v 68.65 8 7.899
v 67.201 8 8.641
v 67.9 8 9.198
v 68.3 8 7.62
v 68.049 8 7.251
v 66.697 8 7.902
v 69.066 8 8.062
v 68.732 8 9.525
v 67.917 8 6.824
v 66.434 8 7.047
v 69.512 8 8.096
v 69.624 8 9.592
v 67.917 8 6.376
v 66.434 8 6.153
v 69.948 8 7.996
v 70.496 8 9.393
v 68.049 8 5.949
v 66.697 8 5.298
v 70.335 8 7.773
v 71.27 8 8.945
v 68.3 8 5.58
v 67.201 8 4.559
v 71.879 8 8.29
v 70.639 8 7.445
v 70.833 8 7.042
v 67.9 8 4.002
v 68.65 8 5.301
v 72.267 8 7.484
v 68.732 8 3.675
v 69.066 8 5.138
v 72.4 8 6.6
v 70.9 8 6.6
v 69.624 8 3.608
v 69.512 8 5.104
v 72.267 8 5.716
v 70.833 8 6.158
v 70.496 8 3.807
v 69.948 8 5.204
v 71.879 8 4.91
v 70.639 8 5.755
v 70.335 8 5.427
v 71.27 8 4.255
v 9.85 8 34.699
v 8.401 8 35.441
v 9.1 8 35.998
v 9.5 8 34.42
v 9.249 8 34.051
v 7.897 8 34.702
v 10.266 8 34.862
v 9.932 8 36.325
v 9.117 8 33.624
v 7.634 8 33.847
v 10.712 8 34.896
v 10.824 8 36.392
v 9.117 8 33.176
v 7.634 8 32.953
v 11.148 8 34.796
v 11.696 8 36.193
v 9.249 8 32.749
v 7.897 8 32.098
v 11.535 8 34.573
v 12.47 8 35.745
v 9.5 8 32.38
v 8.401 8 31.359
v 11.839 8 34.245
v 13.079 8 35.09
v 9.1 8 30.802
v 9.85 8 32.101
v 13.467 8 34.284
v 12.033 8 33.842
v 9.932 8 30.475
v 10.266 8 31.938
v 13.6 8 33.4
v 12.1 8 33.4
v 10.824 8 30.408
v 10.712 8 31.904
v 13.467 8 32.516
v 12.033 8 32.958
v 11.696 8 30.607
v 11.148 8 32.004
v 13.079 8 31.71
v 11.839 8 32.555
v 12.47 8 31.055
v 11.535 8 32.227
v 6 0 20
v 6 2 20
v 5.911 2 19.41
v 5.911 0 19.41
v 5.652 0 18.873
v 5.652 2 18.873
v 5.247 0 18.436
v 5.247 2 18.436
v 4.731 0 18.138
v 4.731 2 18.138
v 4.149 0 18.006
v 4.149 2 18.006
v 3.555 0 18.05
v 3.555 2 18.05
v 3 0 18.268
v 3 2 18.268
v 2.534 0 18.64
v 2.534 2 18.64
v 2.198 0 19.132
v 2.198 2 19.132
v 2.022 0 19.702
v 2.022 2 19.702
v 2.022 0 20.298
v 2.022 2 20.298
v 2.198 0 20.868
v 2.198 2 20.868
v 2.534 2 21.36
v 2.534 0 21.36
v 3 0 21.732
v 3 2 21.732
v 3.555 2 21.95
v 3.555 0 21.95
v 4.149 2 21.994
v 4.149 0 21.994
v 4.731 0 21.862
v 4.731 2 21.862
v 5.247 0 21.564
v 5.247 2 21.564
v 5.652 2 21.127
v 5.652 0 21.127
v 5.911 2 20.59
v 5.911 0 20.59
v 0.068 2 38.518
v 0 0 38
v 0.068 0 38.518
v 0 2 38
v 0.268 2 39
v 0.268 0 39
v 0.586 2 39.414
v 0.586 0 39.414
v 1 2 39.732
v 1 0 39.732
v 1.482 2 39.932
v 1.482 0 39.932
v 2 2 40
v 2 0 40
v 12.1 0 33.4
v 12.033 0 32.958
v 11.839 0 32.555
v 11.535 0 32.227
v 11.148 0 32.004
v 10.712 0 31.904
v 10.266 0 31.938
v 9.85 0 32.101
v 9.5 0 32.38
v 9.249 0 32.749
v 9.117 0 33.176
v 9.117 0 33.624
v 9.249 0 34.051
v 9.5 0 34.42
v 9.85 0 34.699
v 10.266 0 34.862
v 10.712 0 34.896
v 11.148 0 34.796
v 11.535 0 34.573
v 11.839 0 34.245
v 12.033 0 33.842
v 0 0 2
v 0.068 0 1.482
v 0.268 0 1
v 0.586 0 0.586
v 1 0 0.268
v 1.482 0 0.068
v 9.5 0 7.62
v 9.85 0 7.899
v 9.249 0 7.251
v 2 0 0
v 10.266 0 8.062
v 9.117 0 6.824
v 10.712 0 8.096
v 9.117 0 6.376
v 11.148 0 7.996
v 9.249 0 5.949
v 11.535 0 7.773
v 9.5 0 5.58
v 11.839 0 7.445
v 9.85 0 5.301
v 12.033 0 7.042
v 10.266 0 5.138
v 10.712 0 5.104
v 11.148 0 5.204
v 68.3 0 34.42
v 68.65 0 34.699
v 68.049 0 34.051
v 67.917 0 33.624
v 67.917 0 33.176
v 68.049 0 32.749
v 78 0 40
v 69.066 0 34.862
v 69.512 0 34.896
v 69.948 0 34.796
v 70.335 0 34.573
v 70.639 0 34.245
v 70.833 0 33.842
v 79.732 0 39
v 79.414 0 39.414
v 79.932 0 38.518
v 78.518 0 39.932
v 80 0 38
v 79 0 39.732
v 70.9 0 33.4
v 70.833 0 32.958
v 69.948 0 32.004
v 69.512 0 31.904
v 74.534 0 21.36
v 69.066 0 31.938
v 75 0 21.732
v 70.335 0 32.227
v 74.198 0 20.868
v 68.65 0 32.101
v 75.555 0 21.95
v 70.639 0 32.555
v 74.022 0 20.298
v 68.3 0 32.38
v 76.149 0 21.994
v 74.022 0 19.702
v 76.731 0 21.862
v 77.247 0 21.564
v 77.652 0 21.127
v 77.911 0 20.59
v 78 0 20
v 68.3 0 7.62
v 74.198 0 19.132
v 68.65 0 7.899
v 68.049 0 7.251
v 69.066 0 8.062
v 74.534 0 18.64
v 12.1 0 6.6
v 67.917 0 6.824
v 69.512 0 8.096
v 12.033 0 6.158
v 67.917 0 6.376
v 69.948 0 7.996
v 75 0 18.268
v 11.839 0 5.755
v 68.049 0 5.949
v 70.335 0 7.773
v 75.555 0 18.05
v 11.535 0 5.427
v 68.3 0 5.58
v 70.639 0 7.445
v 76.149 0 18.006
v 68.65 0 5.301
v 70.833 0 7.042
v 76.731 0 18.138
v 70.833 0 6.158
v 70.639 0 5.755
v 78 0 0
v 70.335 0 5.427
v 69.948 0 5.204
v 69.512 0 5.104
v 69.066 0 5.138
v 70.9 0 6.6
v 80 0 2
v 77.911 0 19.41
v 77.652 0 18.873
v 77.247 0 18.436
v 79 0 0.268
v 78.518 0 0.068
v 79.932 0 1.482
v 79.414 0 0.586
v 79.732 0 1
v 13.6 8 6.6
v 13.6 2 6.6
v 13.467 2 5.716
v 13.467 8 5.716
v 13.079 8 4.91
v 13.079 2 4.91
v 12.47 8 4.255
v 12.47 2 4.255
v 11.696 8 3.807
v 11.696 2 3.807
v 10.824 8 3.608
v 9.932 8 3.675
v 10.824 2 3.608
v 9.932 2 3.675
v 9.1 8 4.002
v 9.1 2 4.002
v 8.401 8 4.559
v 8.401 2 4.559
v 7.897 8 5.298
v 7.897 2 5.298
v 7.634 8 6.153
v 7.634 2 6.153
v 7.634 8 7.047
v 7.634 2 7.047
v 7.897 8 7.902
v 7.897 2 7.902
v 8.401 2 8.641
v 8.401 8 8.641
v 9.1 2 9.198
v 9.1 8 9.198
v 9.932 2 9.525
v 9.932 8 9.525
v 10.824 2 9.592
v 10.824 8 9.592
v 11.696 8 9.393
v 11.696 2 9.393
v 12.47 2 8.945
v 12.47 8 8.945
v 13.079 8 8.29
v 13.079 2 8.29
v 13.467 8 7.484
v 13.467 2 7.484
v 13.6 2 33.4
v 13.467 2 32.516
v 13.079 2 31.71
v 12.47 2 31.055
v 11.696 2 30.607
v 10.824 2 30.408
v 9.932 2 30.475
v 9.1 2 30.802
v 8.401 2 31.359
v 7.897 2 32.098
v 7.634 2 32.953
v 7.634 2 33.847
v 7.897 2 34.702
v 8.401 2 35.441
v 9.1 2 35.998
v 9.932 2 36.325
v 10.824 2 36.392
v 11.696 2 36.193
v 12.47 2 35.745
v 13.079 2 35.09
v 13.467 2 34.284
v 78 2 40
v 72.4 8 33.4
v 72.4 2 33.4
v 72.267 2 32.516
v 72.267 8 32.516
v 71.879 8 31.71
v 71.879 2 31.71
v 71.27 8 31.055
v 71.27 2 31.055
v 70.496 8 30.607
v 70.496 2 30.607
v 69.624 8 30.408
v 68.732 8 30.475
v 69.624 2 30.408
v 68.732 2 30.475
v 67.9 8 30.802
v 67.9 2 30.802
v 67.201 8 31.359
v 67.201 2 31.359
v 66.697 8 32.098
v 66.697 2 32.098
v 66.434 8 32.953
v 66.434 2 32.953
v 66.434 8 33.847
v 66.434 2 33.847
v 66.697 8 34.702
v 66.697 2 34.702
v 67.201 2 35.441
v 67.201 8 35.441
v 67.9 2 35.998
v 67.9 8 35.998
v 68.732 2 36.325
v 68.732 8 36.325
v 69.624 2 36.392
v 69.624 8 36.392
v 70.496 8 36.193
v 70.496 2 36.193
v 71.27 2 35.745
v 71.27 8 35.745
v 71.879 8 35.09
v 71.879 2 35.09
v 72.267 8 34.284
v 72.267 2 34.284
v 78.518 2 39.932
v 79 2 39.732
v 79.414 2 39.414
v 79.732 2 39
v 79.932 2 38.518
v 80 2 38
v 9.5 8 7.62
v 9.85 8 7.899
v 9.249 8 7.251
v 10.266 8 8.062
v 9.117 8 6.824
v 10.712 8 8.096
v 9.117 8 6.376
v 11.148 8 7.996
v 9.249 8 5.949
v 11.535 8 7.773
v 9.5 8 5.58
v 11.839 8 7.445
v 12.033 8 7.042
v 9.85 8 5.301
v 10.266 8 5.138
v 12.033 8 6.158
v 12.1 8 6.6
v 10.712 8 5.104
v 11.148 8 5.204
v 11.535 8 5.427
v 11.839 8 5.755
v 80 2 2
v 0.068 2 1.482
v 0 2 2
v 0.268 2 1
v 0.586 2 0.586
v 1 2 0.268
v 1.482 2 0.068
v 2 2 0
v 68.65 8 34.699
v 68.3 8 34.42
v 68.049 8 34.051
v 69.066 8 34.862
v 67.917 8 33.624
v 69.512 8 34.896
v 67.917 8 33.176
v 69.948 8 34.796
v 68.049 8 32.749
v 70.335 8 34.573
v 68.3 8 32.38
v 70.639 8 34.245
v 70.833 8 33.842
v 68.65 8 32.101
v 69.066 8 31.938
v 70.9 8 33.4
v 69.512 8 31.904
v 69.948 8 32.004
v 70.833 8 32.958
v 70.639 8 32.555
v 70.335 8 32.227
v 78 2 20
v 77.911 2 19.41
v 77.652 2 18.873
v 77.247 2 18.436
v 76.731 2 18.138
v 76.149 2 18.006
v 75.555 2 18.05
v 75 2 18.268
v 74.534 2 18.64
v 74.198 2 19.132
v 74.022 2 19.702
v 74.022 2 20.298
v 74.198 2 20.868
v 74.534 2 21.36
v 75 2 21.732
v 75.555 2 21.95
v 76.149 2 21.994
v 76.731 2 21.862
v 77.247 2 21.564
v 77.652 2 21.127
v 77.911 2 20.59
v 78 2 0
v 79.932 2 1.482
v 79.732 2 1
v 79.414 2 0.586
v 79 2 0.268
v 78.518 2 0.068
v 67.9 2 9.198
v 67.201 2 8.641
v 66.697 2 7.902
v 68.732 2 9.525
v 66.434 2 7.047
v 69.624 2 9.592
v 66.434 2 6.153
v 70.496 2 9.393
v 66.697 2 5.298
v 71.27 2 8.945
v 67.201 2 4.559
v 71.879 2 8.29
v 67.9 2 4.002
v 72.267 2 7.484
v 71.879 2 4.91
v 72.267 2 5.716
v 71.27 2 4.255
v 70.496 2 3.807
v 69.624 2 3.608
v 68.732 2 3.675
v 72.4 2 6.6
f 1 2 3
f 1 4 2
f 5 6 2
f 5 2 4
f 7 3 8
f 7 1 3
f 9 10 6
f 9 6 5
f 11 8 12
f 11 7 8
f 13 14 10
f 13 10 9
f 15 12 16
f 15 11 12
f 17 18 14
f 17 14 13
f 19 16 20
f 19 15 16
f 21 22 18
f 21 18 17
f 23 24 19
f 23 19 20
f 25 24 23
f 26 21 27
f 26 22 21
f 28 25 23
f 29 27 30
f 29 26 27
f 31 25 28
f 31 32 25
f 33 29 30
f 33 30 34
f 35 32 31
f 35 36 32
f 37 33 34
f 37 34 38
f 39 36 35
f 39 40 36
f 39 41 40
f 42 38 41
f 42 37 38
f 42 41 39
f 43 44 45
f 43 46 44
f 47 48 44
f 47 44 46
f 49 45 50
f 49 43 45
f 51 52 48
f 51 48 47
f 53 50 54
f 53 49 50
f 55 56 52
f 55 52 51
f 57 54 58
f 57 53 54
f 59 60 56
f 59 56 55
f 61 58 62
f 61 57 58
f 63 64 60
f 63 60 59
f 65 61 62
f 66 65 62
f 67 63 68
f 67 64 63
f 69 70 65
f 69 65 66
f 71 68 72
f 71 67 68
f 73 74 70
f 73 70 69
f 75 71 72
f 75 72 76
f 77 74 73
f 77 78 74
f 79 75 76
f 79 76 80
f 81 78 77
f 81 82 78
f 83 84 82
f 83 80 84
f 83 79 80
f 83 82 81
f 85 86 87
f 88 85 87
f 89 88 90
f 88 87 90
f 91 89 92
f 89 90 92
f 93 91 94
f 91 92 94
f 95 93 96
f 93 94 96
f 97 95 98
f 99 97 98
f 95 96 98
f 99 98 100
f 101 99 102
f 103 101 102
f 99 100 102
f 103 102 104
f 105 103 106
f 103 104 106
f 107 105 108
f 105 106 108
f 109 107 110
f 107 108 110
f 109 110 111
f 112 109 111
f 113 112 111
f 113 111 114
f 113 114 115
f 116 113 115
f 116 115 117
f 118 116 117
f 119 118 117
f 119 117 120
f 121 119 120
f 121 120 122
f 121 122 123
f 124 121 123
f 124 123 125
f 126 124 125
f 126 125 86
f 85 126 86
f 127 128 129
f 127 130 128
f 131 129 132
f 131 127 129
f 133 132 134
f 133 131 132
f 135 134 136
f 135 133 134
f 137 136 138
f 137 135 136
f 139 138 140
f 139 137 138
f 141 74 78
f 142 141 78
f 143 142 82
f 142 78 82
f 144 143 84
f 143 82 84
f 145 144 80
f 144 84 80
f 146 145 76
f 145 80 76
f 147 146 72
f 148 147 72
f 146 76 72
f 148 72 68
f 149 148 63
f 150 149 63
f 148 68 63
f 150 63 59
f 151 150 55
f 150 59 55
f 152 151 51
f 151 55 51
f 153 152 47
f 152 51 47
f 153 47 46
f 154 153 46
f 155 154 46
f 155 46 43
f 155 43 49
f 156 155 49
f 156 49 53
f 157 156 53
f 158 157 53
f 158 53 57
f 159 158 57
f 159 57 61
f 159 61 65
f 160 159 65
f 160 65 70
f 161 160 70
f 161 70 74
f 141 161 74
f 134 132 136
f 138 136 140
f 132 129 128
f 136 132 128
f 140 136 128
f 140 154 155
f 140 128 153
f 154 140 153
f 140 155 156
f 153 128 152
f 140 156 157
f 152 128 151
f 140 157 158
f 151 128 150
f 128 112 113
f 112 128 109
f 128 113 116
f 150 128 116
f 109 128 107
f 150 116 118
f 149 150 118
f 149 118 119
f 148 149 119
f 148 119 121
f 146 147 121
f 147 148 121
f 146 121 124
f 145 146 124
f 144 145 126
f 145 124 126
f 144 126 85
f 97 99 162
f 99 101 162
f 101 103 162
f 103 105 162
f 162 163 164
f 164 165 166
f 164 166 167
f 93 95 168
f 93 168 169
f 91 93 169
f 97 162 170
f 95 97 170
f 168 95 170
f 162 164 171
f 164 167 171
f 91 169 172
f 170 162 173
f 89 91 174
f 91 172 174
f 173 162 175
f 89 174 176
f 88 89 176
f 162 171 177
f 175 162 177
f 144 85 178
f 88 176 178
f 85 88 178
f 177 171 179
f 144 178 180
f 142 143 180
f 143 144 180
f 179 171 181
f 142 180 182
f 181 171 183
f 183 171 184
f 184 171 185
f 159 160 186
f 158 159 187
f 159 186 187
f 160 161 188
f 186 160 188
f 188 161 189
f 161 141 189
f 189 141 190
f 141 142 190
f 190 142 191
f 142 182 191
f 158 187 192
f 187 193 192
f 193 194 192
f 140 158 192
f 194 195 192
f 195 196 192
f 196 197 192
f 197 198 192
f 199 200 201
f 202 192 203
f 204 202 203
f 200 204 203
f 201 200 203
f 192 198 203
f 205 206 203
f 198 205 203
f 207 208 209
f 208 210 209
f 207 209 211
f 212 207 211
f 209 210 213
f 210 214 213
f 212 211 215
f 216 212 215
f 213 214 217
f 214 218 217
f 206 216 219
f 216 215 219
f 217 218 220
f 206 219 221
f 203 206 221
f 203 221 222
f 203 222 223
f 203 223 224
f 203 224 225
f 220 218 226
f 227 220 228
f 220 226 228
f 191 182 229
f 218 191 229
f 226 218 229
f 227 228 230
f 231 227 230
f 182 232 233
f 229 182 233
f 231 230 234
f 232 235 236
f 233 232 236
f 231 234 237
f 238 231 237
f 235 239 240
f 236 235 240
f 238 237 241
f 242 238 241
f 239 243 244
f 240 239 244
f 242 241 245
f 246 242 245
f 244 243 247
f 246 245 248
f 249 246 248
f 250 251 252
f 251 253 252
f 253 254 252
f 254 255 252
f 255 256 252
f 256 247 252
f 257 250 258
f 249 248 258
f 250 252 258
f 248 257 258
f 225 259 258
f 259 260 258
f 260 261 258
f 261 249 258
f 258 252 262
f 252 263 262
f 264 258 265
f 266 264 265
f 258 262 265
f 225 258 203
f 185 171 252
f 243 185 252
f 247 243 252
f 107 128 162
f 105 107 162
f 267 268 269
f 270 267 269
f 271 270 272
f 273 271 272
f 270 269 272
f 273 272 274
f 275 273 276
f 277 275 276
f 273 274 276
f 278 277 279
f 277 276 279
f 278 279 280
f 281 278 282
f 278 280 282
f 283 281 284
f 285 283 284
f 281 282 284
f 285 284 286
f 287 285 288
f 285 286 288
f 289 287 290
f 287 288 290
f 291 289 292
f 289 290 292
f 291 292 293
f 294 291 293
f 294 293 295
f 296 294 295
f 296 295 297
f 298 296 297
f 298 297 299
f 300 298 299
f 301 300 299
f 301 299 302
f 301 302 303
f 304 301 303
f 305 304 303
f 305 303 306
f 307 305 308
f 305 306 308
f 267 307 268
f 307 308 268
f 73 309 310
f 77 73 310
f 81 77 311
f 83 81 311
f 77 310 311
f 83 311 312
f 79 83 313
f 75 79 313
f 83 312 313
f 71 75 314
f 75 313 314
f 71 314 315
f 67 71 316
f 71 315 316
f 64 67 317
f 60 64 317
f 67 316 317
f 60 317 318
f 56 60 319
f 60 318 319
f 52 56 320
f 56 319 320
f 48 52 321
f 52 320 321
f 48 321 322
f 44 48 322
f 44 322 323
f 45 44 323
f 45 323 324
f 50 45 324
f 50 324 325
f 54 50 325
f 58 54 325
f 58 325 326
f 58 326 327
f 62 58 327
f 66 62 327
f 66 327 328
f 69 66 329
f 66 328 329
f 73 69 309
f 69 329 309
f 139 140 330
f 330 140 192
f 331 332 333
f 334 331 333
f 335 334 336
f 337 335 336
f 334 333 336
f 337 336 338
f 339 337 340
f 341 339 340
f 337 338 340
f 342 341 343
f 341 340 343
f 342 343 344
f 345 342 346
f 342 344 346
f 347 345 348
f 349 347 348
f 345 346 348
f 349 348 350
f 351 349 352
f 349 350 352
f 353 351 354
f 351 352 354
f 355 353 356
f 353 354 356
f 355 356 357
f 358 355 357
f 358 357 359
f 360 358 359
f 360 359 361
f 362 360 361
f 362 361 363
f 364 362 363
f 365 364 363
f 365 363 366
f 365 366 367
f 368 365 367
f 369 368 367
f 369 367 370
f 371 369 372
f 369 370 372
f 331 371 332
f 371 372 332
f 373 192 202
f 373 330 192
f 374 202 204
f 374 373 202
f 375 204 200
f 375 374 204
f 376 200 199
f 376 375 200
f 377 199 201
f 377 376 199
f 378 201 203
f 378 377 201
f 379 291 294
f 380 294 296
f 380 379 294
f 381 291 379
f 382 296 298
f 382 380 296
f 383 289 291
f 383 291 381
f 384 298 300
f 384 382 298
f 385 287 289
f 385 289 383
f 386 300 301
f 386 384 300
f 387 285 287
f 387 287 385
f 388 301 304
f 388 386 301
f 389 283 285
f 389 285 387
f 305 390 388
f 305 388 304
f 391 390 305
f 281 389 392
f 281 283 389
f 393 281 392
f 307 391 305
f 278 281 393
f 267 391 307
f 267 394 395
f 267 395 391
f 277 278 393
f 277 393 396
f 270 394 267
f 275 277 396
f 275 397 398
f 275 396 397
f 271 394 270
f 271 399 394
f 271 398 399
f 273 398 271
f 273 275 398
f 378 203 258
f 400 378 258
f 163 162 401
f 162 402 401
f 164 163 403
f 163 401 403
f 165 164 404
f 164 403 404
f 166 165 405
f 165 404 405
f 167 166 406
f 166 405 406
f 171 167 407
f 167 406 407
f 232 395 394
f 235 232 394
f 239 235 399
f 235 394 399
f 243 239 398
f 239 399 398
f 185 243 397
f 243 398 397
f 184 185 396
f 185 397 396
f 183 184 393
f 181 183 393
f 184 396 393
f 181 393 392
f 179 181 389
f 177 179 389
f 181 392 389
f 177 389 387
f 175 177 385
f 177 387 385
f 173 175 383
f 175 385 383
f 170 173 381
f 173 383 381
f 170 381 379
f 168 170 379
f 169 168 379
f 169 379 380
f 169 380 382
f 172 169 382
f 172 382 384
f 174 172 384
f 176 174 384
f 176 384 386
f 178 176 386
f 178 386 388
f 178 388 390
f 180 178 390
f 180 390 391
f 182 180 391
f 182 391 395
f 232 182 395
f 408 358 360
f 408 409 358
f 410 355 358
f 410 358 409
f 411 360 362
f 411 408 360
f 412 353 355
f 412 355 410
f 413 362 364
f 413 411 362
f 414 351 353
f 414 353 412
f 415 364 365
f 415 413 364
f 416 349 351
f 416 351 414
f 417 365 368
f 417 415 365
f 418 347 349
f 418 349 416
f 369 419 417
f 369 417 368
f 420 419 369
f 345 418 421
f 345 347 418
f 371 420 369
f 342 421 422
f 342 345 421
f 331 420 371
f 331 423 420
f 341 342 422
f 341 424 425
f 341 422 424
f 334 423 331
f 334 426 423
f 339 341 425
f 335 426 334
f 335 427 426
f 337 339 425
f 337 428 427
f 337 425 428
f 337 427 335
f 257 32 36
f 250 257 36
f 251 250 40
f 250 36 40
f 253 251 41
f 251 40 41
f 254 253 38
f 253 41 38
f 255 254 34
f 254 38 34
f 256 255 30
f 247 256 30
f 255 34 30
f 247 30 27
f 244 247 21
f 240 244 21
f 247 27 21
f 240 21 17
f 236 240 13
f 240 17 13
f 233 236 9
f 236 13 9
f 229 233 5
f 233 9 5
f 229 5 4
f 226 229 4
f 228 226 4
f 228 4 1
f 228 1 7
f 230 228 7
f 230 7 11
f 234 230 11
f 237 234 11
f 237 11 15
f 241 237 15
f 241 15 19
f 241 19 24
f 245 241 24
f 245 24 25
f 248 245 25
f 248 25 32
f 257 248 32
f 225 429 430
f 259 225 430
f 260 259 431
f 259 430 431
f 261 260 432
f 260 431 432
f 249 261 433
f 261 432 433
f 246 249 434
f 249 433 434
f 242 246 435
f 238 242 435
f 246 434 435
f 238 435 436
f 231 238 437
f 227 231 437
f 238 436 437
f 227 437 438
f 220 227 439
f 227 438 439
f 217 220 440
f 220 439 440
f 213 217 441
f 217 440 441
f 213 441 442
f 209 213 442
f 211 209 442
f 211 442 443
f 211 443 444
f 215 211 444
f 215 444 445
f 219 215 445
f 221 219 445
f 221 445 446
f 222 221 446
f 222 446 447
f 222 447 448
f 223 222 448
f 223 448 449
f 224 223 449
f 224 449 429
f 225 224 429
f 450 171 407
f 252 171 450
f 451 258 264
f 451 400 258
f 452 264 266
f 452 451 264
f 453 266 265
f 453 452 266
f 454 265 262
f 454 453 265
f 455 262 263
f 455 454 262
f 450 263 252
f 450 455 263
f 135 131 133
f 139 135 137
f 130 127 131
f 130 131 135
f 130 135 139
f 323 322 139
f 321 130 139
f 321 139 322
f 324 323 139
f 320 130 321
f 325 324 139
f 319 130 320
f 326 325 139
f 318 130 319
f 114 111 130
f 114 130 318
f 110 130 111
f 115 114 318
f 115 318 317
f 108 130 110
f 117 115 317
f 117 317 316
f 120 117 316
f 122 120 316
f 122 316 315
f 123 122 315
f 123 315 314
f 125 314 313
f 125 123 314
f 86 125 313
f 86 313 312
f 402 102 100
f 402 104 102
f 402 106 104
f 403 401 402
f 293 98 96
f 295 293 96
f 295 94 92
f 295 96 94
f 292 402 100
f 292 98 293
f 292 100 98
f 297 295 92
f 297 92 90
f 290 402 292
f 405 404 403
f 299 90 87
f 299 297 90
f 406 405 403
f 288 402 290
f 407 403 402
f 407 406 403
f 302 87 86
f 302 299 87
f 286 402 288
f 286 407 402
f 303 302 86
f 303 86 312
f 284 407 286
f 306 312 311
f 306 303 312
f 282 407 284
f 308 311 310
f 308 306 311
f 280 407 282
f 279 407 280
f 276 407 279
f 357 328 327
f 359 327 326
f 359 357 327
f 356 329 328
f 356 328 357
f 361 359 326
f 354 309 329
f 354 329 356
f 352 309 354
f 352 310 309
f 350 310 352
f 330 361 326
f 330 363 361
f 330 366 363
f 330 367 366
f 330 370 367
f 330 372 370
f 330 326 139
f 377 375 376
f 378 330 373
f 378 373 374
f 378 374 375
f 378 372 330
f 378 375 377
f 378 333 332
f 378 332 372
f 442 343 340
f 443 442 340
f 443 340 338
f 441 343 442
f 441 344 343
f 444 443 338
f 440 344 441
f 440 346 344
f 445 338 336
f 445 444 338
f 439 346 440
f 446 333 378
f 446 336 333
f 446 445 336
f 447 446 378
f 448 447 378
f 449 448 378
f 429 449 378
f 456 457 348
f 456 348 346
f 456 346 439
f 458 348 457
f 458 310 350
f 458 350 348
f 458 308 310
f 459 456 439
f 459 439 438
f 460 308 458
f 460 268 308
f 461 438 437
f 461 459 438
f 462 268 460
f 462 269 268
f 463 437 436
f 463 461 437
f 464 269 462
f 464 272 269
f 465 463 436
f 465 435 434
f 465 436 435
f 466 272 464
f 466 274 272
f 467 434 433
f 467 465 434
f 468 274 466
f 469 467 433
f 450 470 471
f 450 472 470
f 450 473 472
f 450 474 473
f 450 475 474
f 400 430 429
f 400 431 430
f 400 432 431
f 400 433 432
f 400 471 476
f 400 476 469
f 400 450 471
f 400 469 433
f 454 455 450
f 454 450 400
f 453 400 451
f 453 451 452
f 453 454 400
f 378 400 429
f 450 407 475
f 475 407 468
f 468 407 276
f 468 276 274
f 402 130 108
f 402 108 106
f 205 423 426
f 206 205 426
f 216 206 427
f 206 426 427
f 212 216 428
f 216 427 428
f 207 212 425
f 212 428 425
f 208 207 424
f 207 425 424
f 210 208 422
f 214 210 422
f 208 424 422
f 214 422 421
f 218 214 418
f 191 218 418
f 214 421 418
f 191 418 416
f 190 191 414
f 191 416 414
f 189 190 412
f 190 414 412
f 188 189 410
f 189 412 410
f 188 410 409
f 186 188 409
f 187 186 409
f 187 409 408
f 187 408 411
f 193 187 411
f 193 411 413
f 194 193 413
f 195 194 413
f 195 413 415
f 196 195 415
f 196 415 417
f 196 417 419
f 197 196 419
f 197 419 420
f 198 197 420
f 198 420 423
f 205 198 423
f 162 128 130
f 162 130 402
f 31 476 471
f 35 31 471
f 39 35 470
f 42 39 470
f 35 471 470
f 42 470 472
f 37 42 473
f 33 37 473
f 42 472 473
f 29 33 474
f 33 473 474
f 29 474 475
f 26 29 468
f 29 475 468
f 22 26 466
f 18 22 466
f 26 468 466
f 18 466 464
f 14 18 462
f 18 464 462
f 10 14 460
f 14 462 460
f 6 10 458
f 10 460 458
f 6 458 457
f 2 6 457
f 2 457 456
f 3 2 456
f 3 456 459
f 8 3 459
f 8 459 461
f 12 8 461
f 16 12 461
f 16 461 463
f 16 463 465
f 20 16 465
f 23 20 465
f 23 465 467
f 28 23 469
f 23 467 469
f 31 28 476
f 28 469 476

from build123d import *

# Parameters (mm, degrees)
SKETCH_1_W               = 80
SKETCH_1_H               = 40
EXTRUDE_1_DEPTH          = 2
SKETCH_2_R               = 3
EXTRUDE_2_DEPTH          = 6
SKETCH_3_R               = 1.5
CUT_EXTRUDE_1_DEPTH      = 1
CUT_EXTRUDE_1_DEPTH_BACK = 9
SKETCH_4_R               = 2
CUT_EXTRUDE_2_DEPTH      = 7
CUT_EXTRUDE_2_DEPTH_BACK = 3
FILLET_1_R               = 2
FILLET_2_R               = 2
FILLET_3_R               = 2
FILLET_4_R               = 2


with BuildPart() as part:
    # Эскиз1 → Бобышка-Вытянуть1 (new body)
    with BuildSketch(Plane(origin=(0, 0, 0), x_dir=(1, 0, 0), z_dir=(0, 1, 0))):
        with Locations((40, -20)):
            Rectangle(SKETCH_1_W, SKETCH_1_H)
    extrude(amount=EXTRUDE_1_DEPTH)

    # Эскиз2 → Бобышка-Вытянуть2 (add)
    with BuildSketch(Plane(origin=(0, 2, 0), x_dir=(1, 0, 0), z_dir=(0, 1, 0))):
        with Locations((10.6, -6.6)):
            Circle(SKETCH_2_R)
        with Locations((10.6, -33.4)):
            Circle(SKETCH_2_R)
        with Locations((69.4, -6.6)):
            Circle(SKETCH_2_R)
        with Locations((69.4, -33.4)):
            Circle(SKETCH_2_R)
    extrude(amount=EXTRUDE_2_DEPTH)

    # Эскиз3 → Вырез-Вытянуть1 (cut, two sides)
    with BuildSketch(Plane(origin=(0, 8, 0), x_dir=(1, 0, 0), z_dir=(0, 1, 0))) as cut_extrude_1_sk:
        with Locations((10.6, -6.6)):
            Circle(SKETCH_3_R)
        with Locations((10.6, -33.4)):
            Circle(SKETCH_3_R)
        with Locations((69.4, -6.6)):
            Circle(SKETCH_3_R)
        with Locations((69.4, -33.4)):
            Circle(SKETCH_3_R)
    extrude(amount=CUT_EXTRUDE_1_DEPTH, mode=Mode.SUBTRACT)
    extrude(cut_extrude_1_sk.sketch, amount=-CUT_EXTRUDE_1_DEPTH_BACK, mode=Mode.SUBTRACT)

    # Эскиз4 → Вырез-Вытянуть2 (cut, two sides)
    with BuildSketch(Plane(origin=(0, 2, 0), x_dir=(1, 0, 0), z_dir=(0, 1, 0))) as cut_extrude_2_sk:
        with Locations((4, -20)):
            Circle(SKETCH_4_R)
        with Locations((76, -20)):
            Circle(SKETCH_4_R)
    extrude(amount=CUT_EXTRUDE_2_DEPTH, mode=Mode.SUBTRACT)
    extrude(cut_extrude_2_sk.sketch, amount=-CUT_EXTRUDE_2_DEPTH_BACK, mode=Mode.SUBTRACT)

    # Скругление1
    fillet_1_edges = [part.edges().sort_by_distance(p)[0] for p in [
        (0, 1, 0),
    ]]
    fillet(fillet_1_edges, radius=FILLET_1_R)

    # Скругление2
    fillet_2_edges = [part.edges().sort_by_distance(p)[0] for p in [
        (0, 1, 40),
    ]]
    fillet(fillet_2_edges, radius=FILLET_2_R)

    # Скругление3
    fillet_3_edges = [part.edges().sort_by_distance(p)[0] for p in [
        (80, 1, 40),
    ]]
    fillet(fillet_3_edges, radius=FILLET_3_R)

    # Скругление4
    fillet_4_edges = [part.edges().sort_by_distance(p)[0] for p in [
        (80, 1, 0),
    ]]
    fillet(fillet_4_edges, radius=FILLET_4_R)


solid = part.part
